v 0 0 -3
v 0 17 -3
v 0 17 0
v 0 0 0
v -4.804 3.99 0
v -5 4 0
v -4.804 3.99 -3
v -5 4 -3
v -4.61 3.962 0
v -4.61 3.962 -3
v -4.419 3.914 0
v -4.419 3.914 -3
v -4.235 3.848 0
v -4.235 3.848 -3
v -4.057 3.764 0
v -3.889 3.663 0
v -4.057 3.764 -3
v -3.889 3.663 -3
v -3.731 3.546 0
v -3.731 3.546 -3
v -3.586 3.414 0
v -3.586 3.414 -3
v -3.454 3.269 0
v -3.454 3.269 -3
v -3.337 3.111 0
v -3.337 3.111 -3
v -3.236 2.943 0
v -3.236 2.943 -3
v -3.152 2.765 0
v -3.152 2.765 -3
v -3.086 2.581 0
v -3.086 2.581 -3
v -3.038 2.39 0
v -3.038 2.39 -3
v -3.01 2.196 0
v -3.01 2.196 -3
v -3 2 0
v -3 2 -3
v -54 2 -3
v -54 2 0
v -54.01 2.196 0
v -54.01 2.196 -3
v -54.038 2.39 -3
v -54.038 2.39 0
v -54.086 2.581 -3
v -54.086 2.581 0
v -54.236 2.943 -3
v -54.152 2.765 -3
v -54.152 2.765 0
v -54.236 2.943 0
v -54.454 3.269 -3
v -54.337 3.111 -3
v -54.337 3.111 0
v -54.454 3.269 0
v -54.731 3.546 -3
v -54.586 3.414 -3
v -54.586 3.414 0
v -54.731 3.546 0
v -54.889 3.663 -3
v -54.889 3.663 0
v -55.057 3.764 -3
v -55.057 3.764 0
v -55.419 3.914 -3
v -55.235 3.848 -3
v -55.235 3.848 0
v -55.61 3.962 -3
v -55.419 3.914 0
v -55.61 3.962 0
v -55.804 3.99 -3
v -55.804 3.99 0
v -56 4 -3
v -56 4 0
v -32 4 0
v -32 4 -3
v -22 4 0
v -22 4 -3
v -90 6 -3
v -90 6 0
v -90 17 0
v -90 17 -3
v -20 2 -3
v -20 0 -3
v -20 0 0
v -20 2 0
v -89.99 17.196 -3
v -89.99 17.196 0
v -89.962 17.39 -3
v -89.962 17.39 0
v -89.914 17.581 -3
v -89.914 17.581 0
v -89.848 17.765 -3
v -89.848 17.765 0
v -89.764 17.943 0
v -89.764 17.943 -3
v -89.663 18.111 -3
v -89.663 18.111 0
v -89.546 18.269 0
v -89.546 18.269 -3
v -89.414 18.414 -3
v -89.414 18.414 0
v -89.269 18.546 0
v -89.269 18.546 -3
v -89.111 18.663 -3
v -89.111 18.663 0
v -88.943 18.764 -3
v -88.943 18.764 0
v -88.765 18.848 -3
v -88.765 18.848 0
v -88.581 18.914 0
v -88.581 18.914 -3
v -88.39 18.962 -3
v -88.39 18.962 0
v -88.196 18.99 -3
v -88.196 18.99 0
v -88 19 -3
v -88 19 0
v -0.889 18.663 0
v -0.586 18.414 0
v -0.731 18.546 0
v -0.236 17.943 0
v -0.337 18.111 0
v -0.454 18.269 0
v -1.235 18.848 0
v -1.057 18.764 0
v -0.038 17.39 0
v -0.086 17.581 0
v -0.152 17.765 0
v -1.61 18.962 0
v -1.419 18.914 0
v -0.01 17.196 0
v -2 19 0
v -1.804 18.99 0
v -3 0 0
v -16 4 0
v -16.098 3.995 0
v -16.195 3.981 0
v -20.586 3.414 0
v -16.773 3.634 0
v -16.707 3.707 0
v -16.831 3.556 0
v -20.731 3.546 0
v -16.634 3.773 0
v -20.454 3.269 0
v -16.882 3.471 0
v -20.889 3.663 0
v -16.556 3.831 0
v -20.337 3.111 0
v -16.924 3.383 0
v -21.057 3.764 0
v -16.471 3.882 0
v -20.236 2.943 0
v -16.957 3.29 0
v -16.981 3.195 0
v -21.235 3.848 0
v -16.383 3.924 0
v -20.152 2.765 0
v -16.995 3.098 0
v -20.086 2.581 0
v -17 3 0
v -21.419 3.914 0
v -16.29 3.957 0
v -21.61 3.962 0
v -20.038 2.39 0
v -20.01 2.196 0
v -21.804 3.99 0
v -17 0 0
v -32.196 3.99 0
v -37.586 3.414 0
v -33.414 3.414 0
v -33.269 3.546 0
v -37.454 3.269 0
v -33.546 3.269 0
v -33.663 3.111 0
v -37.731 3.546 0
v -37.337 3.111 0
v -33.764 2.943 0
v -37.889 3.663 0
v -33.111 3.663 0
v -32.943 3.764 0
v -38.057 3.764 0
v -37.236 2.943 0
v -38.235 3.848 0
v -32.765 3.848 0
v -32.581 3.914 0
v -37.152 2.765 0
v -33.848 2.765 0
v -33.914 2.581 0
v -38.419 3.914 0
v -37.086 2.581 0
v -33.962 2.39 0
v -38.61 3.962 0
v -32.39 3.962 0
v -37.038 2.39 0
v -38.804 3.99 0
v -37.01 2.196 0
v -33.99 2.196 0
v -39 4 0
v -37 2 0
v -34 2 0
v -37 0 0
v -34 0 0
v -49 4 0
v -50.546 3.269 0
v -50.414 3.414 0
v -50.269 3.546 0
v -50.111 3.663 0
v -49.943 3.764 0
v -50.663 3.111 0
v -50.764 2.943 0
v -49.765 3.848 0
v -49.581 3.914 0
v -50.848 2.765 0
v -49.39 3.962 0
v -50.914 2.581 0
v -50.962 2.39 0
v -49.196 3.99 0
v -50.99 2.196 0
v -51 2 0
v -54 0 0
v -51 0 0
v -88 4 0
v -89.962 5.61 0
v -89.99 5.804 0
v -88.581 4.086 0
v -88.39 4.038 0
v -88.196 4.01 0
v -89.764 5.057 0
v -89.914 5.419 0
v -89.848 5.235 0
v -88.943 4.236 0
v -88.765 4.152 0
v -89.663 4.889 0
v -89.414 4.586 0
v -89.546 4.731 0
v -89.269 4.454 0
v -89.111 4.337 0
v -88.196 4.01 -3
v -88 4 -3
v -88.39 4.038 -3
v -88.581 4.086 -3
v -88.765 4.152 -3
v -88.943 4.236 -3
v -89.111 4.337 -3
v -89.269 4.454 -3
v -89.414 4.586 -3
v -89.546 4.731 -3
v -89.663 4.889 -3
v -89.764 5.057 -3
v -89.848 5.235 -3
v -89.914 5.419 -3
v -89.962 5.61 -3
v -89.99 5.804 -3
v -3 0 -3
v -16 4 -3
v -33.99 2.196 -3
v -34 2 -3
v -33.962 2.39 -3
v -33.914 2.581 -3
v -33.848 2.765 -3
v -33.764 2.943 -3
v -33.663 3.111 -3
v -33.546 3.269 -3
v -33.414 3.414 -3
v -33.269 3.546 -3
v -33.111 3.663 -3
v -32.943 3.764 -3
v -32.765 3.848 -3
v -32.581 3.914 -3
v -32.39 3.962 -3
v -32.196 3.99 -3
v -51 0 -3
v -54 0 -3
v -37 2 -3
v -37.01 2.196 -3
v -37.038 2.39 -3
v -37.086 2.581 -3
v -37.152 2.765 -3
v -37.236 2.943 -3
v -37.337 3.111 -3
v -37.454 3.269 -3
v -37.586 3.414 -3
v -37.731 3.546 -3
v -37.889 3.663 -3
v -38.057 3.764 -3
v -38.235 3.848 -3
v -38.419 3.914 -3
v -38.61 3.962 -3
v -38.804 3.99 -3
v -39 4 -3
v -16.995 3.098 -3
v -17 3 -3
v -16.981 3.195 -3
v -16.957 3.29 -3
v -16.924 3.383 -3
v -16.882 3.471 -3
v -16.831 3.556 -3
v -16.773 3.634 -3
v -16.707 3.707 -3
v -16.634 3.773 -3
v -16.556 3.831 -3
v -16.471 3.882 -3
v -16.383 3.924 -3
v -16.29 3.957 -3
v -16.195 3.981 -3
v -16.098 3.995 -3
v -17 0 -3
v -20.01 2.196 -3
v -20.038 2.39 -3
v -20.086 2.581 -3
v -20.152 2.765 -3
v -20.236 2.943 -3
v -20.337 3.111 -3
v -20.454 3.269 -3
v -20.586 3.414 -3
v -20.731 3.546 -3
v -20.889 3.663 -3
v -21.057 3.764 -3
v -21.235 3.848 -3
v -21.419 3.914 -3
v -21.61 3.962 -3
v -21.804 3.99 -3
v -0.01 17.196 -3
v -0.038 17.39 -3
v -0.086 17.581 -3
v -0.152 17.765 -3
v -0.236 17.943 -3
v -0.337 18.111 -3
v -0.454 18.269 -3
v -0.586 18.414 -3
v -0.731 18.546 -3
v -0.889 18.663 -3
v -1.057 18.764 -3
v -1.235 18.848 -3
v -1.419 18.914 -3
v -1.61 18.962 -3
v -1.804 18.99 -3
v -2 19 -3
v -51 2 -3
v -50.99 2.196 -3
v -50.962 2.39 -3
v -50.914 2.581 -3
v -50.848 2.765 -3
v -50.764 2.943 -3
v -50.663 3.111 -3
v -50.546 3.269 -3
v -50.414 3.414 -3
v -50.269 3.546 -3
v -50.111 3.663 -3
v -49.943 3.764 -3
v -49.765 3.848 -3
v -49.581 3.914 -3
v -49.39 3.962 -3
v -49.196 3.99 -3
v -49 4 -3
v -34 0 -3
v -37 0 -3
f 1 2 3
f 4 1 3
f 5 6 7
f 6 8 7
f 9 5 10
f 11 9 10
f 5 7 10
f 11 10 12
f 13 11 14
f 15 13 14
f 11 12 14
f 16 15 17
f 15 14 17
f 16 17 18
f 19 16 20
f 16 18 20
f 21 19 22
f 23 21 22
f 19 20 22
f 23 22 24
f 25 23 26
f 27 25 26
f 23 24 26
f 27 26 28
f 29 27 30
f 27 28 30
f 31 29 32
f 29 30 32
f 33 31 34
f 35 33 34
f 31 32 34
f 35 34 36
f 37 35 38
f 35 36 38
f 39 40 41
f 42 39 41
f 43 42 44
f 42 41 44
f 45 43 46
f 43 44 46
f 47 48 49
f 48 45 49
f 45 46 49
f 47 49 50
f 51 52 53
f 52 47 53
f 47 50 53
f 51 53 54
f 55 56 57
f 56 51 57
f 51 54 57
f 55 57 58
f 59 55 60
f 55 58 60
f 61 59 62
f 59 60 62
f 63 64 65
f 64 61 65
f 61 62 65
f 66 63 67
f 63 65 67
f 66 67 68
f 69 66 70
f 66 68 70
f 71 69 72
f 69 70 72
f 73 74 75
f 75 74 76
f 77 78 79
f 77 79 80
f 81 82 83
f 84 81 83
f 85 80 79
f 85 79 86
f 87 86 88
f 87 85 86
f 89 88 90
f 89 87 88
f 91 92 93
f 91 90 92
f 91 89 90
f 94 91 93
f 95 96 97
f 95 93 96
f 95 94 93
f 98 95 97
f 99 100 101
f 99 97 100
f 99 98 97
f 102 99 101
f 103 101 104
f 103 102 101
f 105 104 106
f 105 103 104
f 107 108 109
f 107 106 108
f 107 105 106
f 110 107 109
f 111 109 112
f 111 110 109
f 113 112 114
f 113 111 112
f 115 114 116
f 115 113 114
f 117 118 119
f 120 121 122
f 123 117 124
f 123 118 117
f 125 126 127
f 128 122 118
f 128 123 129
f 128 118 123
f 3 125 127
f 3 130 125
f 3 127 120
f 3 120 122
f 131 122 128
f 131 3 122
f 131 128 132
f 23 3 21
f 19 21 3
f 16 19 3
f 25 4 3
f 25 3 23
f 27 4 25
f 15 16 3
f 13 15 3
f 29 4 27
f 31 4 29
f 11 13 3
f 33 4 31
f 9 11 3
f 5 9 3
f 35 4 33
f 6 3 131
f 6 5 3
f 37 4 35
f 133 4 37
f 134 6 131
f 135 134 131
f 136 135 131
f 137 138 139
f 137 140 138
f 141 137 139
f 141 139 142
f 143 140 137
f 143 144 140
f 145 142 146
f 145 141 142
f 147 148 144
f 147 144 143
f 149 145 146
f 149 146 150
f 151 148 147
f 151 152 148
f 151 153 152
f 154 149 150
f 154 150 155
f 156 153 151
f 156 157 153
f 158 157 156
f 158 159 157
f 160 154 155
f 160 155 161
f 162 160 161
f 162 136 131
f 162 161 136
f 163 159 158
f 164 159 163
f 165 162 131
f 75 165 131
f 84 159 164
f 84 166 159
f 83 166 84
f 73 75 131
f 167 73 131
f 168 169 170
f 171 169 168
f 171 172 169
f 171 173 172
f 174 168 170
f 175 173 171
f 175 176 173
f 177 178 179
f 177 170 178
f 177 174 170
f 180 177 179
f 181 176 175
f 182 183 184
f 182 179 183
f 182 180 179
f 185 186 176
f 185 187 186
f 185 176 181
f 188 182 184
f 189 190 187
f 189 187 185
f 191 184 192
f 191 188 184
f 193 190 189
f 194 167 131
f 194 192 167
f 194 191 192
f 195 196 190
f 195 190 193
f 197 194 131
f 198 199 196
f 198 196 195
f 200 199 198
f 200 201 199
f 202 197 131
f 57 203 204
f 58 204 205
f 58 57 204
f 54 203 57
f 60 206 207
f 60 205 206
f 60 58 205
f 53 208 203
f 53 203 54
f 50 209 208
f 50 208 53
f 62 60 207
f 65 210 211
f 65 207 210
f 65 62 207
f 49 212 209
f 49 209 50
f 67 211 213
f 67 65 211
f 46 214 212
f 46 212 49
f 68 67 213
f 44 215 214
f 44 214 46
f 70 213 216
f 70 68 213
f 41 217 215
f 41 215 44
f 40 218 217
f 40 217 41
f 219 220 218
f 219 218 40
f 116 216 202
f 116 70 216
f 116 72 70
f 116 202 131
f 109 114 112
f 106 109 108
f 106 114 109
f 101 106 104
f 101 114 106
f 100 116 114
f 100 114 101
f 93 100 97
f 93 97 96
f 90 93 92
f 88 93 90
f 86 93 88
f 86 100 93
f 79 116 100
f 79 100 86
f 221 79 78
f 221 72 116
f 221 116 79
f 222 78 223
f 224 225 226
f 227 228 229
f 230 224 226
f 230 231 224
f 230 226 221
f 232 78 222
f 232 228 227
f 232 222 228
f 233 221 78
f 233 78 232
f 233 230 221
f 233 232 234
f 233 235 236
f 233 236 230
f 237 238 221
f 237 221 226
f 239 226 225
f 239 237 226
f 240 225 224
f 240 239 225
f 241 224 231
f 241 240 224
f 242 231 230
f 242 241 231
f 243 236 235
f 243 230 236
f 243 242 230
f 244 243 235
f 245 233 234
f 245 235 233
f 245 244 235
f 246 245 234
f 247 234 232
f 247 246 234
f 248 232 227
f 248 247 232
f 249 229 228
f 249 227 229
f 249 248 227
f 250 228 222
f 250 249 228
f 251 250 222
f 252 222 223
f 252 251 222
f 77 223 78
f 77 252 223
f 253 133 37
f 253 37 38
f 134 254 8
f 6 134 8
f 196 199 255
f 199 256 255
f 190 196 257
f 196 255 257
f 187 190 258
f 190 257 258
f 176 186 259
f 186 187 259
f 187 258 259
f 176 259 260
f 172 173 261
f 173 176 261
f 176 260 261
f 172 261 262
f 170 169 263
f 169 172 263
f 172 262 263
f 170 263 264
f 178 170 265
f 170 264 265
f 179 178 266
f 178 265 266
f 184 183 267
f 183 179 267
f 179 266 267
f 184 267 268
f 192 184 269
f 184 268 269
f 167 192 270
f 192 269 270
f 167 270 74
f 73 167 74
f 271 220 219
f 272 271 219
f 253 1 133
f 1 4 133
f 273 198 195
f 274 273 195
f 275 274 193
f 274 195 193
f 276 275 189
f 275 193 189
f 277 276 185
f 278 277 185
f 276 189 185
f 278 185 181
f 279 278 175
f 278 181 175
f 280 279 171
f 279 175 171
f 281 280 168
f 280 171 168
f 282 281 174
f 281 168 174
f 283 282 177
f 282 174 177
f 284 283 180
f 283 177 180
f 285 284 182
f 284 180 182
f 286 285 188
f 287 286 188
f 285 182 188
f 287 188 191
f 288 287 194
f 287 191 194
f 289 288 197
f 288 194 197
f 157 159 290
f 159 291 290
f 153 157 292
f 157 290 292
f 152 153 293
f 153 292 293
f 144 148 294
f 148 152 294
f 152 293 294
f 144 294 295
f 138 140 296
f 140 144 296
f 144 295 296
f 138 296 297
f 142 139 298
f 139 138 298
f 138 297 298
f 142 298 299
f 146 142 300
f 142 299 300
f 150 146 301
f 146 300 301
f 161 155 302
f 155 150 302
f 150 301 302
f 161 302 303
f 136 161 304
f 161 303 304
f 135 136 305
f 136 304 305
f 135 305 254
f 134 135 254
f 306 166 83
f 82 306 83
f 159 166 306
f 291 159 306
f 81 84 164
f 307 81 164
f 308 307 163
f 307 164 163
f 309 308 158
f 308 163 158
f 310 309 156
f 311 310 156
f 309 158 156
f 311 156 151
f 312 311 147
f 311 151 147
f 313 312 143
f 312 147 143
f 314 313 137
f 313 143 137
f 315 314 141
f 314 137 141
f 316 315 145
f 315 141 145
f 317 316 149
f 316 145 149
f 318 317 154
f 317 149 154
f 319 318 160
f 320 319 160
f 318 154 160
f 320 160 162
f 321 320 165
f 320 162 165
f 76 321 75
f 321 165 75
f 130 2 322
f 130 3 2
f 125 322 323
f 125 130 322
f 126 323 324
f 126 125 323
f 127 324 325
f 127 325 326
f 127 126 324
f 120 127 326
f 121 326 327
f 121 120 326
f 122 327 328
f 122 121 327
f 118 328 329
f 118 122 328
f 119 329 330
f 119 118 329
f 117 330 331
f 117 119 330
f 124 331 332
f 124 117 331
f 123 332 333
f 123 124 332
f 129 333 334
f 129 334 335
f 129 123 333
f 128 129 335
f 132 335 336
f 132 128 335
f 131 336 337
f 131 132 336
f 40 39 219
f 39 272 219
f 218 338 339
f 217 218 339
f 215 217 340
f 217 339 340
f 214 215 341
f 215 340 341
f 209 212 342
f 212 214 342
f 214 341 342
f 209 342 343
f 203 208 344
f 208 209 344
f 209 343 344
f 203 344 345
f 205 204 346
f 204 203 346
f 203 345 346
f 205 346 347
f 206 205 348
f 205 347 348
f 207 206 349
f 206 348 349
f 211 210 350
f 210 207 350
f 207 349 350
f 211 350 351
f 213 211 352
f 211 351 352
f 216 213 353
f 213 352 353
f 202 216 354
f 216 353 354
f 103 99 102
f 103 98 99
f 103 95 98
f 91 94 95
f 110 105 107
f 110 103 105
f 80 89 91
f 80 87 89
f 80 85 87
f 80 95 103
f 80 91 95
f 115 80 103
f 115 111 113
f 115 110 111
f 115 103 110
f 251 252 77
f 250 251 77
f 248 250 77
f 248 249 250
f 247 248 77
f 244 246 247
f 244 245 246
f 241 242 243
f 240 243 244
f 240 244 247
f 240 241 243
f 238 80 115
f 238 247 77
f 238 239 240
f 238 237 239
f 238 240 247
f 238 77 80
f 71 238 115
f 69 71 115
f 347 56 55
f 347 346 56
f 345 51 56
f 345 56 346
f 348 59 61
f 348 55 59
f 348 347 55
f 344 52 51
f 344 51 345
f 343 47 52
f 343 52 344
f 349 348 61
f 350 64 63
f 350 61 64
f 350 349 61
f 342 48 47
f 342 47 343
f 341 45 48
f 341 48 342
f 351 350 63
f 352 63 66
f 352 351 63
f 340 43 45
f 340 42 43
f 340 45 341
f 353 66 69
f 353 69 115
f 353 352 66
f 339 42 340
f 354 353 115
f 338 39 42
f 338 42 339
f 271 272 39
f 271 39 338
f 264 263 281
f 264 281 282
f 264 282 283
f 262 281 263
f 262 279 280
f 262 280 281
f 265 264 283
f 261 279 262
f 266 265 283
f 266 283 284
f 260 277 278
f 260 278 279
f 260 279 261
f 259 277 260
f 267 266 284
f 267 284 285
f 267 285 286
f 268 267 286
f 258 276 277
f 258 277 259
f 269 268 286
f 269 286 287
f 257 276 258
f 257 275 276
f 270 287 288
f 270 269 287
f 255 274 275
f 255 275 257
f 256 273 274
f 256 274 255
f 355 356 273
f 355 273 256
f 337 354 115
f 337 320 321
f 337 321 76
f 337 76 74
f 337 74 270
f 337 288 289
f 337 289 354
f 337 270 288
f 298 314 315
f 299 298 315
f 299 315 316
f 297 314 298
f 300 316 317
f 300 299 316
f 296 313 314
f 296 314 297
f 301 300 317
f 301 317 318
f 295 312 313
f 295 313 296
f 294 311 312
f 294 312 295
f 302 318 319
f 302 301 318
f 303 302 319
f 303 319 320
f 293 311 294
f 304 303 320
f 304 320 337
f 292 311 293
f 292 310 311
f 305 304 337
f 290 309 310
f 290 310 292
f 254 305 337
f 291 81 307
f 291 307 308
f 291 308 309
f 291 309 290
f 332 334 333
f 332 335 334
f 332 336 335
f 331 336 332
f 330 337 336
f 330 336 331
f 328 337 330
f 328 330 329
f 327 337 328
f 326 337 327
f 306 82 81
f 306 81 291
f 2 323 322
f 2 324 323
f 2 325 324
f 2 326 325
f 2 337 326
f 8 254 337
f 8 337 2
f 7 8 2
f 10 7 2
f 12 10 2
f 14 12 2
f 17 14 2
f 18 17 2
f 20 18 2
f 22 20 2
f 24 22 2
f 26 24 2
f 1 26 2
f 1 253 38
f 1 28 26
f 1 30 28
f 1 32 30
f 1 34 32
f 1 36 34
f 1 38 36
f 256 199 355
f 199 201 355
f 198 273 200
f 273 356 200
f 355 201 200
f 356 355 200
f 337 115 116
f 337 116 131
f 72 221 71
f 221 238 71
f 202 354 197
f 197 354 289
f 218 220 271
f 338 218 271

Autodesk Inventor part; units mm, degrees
ref_plane "YZ Plane" through (0, 0, 0) normal (1, 0, 0) x (0, 1, 0)
ref_plane "XZ Plane" through (0, 0, 0) normal (0, 1, 0) x (-1, 0, 0)
ref_plane "XY Plane" through (0, 0, 0) normal (0, 0, 1) x (1, 0, 0)
sketch "Эскиз1" plane through (0, 0, 0) normal (0, 1, 0) x (-1, 0, 0)
  line L0 (0, 0) -> (3, 0)
  line L1 (3, 0) -> (3, -3)
  line L2 (3, -3) -> (0, -3)
  line L3 (0, -3) -> (0, 0)
  line L4 (3, 0) -> (20, 0)
  line L5 (20, 0) -> (17, 0)
  line L6 (17, 0) -> (17, -3)
  line L7 (17, -3) -> (20, -3)
  line L8 (20, -3) -> (20, 0)
  line L9 (20, 0) -> (37, 0)
  line L10 (37, 0) -> (34, 0)
  line L11 (34, 0) -> (34, -3)
  line L12 (34, -3) -> (37, -3)
  line L13 (37, -3) -> (37, 0)
  line L14 (37, 0) -> (54, 0)
  line L15 (54, 0) -> (51, 0)
  line L16 (51, 0) -> (51, -3)
  line L17 (51, -3) -> (54, -3)
  line L18 (54, -3) -> (54, 0)
  point P0 (17, 0)
  point P1 (17, 0)
  dimension "d0" = 3
  dimension "d1" = 3
  dimension "d17" = 17
  dimension "d18" = 3
  dimension "d19" = 3
  dimension "d20" = 17
  dimension "d21" = 17
  dimension "d22" = 3
  dimension "d23" = 3
  dimension "d24" = 3
  dimension "d25" = 3
extrude "Выдавливание1" add sketch "Эскиз1" along normal blind 4
sketch "Эскиз2" plane through (0, 4, 0) normal (0, 1, 0) x (1, 0, 0)
  line L0 (0, 0) -> (-90, 0)
  line L1 (-90, 0) -> (-90, 3)
  line L2 (-90, 3) -> (0, 3)
  line L3 (0, 3) -> (0, 0)
  dimension "d13" = 3
  dimension "d14" = 90
extrude "Выдавливание2" add sketch "Эскиз2" along normal blind 15
fillet "Сопряжение1" radius 1 1 edges at (-17, 4, -1.5)
fillet "Сопряжение2" radius 2 7 edges at (-34, 4, -1.5) (-51, 4, -1.5) (-54, 4, -1.5) (-37, 4, -1.5) (-20, 4, -1.5) (-3, 4, -1.5) (0, 19, -1.5)
fillet "Сопряжение3" radius 2 2 edges at (-90, 19, -1.5) (-90, 4, -1.5)
properties part number "Bus_copper_GND" material "Медь"
